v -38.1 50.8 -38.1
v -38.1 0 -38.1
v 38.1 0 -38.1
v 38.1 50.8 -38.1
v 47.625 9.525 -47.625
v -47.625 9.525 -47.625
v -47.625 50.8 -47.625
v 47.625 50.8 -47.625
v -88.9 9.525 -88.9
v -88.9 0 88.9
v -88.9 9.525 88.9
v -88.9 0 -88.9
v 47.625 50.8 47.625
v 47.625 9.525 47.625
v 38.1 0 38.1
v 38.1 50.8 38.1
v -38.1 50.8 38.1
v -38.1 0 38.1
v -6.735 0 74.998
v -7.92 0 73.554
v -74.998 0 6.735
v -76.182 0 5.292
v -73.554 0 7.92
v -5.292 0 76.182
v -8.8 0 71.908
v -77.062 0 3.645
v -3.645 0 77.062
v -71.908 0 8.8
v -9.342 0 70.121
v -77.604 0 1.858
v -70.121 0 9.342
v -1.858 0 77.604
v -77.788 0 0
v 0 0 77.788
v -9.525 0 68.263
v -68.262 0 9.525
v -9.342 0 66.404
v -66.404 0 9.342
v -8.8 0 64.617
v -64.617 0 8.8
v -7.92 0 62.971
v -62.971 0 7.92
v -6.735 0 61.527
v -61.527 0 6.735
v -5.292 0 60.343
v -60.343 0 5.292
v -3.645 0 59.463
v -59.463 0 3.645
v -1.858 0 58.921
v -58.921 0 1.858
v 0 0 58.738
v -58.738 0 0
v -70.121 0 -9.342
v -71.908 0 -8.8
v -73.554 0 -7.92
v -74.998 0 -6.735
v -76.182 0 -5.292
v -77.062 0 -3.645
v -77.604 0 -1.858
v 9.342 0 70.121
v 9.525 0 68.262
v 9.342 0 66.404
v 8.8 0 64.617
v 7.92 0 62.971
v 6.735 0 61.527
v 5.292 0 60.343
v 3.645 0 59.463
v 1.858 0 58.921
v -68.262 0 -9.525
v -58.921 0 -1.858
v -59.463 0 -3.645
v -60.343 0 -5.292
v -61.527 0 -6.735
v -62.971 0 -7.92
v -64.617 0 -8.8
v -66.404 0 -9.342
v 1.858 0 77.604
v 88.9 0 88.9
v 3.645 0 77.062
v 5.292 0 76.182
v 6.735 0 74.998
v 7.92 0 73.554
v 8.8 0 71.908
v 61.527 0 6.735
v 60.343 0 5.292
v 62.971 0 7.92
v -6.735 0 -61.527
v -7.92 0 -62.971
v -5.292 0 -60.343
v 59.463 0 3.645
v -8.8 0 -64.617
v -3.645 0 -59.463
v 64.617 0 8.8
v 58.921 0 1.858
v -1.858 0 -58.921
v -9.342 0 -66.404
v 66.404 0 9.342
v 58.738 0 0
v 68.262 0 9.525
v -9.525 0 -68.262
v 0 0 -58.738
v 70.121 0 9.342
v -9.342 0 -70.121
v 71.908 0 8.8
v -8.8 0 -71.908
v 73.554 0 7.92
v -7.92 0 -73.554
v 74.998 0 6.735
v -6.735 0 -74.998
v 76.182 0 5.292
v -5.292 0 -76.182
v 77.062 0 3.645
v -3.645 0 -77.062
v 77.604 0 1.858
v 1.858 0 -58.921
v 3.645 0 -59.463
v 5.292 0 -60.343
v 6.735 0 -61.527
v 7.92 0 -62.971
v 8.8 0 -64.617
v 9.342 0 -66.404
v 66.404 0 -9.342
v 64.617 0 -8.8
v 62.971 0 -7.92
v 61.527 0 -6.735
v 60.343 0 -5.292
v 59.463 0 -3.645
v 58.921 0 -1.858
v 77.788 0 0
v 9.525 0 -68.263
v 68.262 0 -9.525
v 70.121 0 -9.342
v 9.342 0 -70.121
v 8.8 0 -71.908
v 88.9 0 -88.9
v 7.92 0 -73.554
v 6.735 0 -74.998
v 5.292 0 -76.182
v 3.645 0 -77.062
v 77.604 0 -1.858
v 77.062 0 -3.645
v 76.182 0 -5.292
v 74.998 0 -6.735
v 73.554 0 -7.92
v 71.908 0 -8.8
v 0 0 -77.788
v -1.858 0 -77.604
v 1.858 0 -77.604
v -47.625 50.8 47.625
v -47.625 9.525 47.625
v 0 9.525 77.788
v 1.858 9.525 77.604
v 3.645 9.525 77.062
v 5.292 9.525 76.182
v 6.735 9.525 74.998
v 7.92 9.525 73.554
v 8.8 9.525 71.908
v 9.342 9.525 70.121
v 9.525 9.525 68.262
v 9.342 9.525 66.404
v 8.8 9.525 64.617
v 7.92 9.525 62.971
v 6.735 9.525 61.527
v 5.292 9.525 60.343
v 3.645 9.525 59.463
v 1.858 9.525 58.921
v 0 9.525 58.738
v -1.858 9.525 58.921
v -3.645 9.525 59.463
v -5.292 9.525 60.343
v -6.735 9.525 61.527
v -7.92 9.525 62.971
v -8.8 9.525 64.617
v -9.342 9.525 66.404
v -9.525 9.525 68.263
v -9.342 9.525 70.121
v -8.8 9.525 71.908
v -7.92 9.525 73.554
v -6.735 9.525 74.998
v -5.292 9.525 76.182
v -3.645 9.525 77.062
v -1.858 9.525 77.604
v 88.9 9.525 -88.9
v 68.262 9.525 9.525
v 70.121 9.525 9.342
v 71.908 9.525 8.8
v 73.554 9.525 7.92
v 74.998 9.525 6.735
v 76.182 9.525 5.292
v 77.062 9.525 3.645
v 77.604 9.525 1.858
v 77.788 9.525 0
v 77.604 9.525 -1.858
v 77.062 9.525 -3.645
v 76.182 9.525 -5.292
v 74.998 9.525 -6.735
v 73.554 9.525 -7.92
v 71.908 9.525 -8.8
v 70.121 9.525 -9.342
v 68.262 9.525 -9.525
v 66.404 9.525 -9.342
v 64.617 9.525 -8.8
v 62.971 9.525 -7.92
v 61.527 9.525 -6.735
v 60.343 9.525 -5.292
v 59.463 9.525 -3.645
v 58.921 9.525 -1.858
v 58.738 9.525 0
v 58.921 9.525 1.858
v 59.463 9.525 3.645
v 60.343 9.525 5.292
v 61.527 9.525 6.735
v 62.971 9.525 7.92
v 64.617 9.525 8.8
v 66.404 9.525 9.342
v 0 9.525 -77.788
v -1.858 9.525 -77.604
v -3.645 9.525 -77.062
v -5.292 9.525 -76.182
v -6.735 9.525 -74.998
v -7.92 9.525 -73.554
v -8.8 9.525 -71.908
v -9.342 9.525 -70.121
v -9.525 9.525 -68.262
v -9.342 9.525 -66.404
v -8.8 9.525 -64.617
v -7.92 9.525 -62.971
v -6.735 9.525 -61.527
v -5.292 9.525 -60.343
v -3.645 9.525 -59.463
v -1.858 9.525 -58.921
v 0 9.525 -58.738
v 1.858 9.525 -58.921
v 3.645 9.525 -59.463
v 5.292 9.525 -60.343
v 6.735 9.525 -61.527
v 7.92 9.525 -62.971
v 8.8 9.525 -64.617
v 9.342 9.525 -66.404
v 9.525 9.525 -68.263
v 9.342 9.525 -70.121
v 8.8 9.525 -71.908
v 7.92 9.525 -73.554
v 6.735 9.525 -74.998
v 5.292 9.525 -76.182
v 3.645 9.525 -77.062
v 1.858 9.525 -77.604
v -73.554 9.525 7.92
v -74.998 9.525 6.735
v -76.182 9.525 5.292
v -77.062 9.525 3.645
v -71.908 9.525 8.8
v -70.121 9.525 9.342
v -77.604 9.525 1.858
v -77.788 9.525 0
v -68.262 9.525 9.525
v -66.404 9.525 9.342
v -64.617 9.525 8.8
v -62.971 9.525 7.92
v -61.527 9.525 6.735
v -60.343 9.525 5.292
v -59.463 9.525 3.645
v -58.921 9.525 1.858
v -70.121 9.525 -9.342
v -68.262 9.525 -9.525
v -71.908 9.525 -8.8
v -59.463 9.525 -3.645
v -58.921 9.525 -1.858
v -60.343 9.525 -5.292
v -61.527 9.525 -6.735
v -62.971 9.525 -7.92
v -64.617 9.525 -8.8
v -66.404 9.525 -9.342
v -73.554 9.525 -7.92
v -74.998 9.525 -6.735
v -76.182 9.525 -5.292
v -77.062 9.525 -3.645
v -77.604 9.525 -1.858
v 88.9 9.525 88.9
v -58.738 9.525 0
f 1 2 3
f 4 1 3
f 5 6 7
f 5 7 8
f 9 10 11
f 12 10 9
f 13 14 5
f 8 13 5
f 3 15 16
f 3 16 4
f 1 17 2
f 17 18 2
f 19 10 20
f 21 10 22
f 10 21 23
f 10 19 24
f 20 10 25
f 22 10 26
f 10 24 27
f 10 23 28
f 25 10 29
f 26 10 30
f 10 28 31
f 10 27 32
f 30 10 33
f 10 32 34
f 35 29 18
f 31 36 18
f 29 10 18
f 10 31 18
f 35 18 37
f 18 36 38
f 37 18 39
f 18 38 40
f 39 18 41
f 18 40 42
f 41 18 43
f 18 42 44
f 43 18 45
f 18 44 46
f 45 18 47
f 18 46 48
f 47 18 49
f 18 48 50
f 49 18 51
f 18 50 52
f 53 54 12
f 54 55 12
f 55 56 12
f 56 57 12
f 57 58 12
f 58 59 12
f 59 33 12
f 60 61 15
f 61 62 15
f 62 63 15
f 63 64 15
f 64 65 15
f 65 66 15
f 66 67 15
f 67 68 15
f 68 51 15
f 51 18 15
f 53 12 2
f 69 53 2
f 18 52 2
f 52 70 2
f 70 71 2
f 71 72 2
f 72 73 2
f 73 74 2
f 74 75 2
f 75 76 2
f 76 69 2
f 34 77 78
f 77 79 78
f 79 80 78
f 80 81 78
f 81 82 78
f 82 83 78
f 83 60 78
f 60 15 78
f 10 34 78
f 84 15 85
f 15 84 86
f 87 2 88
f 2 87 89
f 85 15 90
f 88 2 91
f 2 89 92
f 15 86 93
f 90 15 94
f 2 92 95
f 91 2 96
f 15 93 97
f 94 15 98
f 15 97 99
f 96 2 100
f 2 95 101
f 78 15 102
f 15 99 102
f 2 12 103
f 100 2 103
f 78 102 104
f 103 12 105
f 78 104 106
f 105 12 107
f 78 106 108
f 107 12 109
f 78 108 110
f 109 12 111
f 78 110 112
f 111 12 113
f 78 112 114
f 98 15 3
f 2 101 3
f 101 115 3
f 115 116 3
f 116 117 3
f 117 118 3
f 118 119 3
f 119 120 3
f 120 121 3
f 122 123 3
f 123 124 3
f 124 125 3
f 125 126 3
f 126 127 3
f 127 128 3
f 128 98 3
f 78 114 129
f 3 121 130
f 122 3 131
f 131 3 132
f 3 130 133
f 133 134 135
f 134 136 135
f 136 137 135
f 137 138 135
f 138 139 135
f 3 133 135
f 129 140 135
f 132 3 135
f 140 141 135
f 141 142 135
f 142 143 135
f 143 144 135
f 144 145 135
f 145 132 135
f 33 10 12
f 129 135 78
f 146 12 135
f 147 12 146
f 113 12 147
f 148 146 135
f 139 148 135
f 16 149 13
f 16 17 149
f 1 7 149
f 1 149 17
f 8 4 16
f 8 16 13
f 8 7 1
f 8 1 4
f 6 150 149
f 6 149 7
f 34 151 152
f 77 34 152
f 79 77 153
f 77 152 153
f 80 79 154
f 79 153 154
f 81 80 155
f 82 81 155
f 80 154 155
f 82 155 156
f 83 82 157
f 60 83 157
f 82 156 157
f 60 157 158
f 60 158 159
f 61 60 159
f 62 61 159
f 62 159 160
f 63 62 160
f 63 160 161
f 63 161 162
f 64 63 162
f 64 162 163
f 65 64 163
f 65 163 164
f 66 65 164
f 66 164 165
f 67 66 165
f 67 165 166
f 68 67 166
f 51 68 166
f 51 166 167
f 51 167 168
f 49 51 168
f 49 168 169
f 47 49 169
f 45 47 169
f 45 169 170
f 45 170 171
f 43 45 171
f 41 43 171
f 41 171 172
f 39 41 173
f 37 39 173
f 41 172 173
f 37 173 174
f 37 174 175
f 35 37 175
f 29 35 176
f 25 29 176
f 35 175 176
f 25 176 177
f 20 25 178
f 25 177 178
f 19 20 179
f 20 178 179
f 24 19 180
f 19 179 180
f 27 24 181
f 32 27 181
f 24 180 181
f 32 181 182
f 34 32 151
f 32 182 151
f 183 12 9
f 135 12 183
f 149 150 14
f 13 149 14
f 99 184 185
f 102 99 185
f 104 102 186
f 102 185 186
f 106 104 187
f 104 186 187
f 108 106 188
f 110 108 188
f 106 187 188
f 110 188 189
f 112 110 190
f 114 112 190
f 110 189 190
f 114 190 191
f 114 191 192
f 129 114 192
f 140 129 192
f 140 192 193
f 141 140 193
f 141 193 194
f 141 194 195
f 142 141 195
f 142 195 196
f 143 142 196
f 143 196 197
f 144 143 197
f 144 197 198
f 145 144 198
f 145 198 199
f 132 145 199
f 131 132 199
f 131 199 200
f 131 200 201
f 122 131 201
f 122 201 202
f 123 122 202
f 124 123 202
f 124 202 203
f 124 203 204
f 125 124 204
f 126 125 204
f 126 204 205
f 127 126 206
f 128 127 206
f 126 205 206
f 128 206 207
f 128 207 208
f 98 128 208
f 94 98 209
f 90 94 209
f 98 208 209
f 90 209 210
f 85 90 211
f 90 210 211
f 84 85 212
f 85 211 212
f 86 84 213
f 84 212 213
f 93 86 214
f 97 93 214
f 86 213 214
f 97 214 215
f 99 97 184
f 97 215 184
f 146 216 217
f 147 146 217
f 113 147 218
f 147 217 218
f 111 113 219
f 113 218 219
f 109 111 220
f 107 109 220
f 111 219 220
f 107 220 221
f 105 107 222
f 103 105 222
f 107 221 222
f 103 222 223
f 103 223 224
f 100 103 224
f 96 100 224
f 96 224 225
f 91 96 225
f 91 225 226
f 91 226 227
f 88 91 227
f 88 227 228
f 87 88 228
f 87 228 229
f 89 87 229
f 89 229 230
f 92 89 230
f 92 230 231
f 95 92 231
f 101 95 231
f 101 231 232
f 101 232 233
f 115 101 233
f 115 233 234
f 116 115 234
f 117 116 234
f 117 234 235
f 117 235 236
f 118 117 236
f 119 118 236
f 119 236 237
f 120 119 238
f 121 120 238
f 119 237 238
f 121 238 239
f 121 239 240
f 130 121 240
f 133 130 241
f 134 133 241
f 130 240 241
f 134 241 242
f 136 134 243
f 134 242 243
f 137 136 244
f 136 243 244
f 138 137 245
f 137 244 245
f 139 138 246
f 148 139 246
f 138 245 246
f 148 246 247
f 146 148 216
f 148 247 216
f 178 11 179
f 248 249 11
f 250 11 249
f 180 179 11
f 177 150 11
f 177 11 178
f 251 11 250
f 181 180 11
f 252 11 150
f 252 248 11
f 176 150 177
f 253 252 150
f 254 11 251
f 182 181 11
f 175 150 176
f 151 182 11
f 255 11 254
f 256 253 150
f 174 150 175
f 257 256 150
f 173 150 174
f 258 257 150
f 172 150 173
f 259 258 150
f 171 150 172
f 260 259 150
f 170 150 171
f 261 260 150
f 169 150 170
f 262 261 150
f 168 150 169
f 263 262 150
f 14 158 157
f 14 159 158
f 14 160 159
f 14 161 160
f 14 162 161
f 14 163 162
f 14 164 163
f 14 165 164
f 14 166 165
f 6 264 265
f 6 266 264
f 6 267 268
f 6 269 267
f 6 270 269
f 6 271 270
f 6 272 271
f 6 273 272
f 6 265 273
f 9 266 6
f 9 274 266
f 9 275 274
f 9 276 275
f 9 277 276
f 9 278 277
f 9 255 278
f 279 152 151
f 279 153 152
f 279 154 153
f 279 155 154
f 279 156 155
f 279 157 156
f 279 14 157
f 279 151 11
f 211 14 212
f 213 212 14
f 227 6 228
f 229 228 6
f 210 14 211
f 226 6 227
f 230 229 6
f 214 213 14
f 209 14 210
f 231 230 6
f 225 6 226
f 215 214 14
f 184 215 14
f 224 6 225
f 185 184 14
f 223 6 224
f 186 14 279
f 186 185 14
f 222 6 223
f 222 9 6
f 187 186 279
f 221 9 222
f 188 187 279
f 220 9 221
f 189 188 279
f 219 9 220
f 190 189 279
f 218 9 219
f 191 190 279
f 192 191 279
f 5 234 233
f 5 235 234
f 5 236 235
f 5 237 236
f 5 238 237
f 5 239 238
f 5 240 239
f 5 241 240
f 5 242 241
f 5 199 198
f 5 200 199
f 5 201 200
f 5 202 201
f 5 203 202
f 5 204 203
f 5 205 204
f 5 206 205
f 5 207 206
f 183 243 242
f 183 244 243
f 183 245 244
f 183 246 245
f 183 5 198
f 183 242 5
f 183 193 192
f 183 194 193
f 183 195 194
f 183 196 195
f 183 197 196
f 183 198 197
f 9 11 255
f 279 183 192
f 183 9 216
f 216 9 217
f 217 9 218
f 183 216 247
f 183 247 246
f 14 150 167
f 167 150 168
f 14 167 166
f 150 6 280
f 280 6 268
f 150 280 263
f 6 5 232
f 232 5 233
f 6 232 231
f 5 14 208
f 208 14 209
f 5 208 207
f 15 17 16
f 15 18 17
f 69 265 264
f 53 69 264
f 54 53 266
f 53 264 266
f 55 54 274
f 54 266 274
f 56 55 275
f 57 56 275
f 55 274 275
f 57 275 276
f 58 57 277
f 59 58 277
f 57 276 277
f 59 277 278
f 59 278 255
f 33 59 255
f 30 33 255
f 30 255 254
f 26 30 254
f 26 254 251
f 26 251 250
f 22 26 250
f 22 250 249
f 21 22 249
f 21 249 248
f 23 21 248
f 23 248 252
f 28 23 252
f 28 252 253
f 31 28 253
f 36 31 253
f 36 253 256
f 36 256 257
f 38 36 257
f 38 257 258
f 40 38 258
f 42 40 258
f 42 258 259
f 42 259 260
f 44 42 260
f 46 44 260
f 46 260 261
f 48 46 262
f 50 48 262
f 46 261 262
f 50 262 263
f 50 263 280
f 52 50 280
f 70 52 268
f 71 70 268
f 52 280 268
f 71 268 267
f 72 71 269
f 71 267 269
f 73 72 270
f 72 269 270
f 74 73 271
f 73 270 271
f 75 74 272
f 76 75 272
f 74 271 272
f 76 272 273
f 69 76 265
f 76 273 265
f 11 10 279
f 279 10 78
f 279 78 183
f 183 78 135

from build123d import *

# Parameters (mm, degrees)
CROQUIS3_W              = 177.8
CROQUIS3_H              = 177.8
CROQUIS3_W_2            = 76.2
CROQUIS3_H_2            = 76.2
SALIENTE_EXTRUIR2_DEPTH = 9.525
CROQUIS4_W              = 95.25
CROQUIS4_H              = 95.25
CROQUIS4_W_2            = 76.2
CROQUIS4_H_2            = 76.2
SALIENTE_EXTRUIR3_DEPTH = 41.275
CROQUIS5_R              = 9.525
CORTAR_EXTRUIR1_DEPTH   = 12


with BuildPart() as part:
    # Croquis3 → Saliente-Extruir2 (new body)
    with BuildSketch(Plane(origin=(0, 0, 0), x_dir=(1, 0, 0), z_dir=(0, 1, 0))):
        Rectangle(CROQUIS3_W, CROQUIS3_H)
        Rectangle(CROQUIS3_W_2, CROQUIS3_H_2, mode=Mode.SUBTRACT)
    extrude(amount=SALIENTE_EXTRUIR2_DEPTH)

    # Croquis4 → Saliente-Extruir3 (add)
    with BuildSketch(Plane(origin=(0, 9.525, 0), x_dir=(1, 0, 0), z_dir=(0, 1, 0))):
        Rectangle(CROQUIS4_W, CROQUIS4_H)
        Rectangle(CROQUIS4_W_2, CROQUIS4_H_2, mode=Mode.SUBTRACT)
    extrude(amount=SALIENTE_EXTRUIR3_DEPTH)

    # Croquis5 → Cortar-Extruir1 (cut)
    with BuildSketch(Plane(origin=(0, 9.525, 0), x_dir=(1, 0, 0), z_dir=(0, 1, 0))):
        with Locations(Location((0, -68.2625, 0), (0, 0, 270))):
            Circle(CROQUIS5_R)
        with Locations(Location((0, 68.2625, 0), (0, 0, 90))):
            Circle(CROQUIS5_R)
        with Locations(Location((-68.2625, 0, 0), (0, 0, 90))):
            Circle(CROQUIS5_R)
        with Locations(Location((68.2625, 0, 0), (0, 0, 270))):
            Circle(CROQUIS5_R)
    extrude(amount=-CORTAR_EXTRUIR1_DEPTH, mode=Mode.SUBTRACT)


solid = part.part
